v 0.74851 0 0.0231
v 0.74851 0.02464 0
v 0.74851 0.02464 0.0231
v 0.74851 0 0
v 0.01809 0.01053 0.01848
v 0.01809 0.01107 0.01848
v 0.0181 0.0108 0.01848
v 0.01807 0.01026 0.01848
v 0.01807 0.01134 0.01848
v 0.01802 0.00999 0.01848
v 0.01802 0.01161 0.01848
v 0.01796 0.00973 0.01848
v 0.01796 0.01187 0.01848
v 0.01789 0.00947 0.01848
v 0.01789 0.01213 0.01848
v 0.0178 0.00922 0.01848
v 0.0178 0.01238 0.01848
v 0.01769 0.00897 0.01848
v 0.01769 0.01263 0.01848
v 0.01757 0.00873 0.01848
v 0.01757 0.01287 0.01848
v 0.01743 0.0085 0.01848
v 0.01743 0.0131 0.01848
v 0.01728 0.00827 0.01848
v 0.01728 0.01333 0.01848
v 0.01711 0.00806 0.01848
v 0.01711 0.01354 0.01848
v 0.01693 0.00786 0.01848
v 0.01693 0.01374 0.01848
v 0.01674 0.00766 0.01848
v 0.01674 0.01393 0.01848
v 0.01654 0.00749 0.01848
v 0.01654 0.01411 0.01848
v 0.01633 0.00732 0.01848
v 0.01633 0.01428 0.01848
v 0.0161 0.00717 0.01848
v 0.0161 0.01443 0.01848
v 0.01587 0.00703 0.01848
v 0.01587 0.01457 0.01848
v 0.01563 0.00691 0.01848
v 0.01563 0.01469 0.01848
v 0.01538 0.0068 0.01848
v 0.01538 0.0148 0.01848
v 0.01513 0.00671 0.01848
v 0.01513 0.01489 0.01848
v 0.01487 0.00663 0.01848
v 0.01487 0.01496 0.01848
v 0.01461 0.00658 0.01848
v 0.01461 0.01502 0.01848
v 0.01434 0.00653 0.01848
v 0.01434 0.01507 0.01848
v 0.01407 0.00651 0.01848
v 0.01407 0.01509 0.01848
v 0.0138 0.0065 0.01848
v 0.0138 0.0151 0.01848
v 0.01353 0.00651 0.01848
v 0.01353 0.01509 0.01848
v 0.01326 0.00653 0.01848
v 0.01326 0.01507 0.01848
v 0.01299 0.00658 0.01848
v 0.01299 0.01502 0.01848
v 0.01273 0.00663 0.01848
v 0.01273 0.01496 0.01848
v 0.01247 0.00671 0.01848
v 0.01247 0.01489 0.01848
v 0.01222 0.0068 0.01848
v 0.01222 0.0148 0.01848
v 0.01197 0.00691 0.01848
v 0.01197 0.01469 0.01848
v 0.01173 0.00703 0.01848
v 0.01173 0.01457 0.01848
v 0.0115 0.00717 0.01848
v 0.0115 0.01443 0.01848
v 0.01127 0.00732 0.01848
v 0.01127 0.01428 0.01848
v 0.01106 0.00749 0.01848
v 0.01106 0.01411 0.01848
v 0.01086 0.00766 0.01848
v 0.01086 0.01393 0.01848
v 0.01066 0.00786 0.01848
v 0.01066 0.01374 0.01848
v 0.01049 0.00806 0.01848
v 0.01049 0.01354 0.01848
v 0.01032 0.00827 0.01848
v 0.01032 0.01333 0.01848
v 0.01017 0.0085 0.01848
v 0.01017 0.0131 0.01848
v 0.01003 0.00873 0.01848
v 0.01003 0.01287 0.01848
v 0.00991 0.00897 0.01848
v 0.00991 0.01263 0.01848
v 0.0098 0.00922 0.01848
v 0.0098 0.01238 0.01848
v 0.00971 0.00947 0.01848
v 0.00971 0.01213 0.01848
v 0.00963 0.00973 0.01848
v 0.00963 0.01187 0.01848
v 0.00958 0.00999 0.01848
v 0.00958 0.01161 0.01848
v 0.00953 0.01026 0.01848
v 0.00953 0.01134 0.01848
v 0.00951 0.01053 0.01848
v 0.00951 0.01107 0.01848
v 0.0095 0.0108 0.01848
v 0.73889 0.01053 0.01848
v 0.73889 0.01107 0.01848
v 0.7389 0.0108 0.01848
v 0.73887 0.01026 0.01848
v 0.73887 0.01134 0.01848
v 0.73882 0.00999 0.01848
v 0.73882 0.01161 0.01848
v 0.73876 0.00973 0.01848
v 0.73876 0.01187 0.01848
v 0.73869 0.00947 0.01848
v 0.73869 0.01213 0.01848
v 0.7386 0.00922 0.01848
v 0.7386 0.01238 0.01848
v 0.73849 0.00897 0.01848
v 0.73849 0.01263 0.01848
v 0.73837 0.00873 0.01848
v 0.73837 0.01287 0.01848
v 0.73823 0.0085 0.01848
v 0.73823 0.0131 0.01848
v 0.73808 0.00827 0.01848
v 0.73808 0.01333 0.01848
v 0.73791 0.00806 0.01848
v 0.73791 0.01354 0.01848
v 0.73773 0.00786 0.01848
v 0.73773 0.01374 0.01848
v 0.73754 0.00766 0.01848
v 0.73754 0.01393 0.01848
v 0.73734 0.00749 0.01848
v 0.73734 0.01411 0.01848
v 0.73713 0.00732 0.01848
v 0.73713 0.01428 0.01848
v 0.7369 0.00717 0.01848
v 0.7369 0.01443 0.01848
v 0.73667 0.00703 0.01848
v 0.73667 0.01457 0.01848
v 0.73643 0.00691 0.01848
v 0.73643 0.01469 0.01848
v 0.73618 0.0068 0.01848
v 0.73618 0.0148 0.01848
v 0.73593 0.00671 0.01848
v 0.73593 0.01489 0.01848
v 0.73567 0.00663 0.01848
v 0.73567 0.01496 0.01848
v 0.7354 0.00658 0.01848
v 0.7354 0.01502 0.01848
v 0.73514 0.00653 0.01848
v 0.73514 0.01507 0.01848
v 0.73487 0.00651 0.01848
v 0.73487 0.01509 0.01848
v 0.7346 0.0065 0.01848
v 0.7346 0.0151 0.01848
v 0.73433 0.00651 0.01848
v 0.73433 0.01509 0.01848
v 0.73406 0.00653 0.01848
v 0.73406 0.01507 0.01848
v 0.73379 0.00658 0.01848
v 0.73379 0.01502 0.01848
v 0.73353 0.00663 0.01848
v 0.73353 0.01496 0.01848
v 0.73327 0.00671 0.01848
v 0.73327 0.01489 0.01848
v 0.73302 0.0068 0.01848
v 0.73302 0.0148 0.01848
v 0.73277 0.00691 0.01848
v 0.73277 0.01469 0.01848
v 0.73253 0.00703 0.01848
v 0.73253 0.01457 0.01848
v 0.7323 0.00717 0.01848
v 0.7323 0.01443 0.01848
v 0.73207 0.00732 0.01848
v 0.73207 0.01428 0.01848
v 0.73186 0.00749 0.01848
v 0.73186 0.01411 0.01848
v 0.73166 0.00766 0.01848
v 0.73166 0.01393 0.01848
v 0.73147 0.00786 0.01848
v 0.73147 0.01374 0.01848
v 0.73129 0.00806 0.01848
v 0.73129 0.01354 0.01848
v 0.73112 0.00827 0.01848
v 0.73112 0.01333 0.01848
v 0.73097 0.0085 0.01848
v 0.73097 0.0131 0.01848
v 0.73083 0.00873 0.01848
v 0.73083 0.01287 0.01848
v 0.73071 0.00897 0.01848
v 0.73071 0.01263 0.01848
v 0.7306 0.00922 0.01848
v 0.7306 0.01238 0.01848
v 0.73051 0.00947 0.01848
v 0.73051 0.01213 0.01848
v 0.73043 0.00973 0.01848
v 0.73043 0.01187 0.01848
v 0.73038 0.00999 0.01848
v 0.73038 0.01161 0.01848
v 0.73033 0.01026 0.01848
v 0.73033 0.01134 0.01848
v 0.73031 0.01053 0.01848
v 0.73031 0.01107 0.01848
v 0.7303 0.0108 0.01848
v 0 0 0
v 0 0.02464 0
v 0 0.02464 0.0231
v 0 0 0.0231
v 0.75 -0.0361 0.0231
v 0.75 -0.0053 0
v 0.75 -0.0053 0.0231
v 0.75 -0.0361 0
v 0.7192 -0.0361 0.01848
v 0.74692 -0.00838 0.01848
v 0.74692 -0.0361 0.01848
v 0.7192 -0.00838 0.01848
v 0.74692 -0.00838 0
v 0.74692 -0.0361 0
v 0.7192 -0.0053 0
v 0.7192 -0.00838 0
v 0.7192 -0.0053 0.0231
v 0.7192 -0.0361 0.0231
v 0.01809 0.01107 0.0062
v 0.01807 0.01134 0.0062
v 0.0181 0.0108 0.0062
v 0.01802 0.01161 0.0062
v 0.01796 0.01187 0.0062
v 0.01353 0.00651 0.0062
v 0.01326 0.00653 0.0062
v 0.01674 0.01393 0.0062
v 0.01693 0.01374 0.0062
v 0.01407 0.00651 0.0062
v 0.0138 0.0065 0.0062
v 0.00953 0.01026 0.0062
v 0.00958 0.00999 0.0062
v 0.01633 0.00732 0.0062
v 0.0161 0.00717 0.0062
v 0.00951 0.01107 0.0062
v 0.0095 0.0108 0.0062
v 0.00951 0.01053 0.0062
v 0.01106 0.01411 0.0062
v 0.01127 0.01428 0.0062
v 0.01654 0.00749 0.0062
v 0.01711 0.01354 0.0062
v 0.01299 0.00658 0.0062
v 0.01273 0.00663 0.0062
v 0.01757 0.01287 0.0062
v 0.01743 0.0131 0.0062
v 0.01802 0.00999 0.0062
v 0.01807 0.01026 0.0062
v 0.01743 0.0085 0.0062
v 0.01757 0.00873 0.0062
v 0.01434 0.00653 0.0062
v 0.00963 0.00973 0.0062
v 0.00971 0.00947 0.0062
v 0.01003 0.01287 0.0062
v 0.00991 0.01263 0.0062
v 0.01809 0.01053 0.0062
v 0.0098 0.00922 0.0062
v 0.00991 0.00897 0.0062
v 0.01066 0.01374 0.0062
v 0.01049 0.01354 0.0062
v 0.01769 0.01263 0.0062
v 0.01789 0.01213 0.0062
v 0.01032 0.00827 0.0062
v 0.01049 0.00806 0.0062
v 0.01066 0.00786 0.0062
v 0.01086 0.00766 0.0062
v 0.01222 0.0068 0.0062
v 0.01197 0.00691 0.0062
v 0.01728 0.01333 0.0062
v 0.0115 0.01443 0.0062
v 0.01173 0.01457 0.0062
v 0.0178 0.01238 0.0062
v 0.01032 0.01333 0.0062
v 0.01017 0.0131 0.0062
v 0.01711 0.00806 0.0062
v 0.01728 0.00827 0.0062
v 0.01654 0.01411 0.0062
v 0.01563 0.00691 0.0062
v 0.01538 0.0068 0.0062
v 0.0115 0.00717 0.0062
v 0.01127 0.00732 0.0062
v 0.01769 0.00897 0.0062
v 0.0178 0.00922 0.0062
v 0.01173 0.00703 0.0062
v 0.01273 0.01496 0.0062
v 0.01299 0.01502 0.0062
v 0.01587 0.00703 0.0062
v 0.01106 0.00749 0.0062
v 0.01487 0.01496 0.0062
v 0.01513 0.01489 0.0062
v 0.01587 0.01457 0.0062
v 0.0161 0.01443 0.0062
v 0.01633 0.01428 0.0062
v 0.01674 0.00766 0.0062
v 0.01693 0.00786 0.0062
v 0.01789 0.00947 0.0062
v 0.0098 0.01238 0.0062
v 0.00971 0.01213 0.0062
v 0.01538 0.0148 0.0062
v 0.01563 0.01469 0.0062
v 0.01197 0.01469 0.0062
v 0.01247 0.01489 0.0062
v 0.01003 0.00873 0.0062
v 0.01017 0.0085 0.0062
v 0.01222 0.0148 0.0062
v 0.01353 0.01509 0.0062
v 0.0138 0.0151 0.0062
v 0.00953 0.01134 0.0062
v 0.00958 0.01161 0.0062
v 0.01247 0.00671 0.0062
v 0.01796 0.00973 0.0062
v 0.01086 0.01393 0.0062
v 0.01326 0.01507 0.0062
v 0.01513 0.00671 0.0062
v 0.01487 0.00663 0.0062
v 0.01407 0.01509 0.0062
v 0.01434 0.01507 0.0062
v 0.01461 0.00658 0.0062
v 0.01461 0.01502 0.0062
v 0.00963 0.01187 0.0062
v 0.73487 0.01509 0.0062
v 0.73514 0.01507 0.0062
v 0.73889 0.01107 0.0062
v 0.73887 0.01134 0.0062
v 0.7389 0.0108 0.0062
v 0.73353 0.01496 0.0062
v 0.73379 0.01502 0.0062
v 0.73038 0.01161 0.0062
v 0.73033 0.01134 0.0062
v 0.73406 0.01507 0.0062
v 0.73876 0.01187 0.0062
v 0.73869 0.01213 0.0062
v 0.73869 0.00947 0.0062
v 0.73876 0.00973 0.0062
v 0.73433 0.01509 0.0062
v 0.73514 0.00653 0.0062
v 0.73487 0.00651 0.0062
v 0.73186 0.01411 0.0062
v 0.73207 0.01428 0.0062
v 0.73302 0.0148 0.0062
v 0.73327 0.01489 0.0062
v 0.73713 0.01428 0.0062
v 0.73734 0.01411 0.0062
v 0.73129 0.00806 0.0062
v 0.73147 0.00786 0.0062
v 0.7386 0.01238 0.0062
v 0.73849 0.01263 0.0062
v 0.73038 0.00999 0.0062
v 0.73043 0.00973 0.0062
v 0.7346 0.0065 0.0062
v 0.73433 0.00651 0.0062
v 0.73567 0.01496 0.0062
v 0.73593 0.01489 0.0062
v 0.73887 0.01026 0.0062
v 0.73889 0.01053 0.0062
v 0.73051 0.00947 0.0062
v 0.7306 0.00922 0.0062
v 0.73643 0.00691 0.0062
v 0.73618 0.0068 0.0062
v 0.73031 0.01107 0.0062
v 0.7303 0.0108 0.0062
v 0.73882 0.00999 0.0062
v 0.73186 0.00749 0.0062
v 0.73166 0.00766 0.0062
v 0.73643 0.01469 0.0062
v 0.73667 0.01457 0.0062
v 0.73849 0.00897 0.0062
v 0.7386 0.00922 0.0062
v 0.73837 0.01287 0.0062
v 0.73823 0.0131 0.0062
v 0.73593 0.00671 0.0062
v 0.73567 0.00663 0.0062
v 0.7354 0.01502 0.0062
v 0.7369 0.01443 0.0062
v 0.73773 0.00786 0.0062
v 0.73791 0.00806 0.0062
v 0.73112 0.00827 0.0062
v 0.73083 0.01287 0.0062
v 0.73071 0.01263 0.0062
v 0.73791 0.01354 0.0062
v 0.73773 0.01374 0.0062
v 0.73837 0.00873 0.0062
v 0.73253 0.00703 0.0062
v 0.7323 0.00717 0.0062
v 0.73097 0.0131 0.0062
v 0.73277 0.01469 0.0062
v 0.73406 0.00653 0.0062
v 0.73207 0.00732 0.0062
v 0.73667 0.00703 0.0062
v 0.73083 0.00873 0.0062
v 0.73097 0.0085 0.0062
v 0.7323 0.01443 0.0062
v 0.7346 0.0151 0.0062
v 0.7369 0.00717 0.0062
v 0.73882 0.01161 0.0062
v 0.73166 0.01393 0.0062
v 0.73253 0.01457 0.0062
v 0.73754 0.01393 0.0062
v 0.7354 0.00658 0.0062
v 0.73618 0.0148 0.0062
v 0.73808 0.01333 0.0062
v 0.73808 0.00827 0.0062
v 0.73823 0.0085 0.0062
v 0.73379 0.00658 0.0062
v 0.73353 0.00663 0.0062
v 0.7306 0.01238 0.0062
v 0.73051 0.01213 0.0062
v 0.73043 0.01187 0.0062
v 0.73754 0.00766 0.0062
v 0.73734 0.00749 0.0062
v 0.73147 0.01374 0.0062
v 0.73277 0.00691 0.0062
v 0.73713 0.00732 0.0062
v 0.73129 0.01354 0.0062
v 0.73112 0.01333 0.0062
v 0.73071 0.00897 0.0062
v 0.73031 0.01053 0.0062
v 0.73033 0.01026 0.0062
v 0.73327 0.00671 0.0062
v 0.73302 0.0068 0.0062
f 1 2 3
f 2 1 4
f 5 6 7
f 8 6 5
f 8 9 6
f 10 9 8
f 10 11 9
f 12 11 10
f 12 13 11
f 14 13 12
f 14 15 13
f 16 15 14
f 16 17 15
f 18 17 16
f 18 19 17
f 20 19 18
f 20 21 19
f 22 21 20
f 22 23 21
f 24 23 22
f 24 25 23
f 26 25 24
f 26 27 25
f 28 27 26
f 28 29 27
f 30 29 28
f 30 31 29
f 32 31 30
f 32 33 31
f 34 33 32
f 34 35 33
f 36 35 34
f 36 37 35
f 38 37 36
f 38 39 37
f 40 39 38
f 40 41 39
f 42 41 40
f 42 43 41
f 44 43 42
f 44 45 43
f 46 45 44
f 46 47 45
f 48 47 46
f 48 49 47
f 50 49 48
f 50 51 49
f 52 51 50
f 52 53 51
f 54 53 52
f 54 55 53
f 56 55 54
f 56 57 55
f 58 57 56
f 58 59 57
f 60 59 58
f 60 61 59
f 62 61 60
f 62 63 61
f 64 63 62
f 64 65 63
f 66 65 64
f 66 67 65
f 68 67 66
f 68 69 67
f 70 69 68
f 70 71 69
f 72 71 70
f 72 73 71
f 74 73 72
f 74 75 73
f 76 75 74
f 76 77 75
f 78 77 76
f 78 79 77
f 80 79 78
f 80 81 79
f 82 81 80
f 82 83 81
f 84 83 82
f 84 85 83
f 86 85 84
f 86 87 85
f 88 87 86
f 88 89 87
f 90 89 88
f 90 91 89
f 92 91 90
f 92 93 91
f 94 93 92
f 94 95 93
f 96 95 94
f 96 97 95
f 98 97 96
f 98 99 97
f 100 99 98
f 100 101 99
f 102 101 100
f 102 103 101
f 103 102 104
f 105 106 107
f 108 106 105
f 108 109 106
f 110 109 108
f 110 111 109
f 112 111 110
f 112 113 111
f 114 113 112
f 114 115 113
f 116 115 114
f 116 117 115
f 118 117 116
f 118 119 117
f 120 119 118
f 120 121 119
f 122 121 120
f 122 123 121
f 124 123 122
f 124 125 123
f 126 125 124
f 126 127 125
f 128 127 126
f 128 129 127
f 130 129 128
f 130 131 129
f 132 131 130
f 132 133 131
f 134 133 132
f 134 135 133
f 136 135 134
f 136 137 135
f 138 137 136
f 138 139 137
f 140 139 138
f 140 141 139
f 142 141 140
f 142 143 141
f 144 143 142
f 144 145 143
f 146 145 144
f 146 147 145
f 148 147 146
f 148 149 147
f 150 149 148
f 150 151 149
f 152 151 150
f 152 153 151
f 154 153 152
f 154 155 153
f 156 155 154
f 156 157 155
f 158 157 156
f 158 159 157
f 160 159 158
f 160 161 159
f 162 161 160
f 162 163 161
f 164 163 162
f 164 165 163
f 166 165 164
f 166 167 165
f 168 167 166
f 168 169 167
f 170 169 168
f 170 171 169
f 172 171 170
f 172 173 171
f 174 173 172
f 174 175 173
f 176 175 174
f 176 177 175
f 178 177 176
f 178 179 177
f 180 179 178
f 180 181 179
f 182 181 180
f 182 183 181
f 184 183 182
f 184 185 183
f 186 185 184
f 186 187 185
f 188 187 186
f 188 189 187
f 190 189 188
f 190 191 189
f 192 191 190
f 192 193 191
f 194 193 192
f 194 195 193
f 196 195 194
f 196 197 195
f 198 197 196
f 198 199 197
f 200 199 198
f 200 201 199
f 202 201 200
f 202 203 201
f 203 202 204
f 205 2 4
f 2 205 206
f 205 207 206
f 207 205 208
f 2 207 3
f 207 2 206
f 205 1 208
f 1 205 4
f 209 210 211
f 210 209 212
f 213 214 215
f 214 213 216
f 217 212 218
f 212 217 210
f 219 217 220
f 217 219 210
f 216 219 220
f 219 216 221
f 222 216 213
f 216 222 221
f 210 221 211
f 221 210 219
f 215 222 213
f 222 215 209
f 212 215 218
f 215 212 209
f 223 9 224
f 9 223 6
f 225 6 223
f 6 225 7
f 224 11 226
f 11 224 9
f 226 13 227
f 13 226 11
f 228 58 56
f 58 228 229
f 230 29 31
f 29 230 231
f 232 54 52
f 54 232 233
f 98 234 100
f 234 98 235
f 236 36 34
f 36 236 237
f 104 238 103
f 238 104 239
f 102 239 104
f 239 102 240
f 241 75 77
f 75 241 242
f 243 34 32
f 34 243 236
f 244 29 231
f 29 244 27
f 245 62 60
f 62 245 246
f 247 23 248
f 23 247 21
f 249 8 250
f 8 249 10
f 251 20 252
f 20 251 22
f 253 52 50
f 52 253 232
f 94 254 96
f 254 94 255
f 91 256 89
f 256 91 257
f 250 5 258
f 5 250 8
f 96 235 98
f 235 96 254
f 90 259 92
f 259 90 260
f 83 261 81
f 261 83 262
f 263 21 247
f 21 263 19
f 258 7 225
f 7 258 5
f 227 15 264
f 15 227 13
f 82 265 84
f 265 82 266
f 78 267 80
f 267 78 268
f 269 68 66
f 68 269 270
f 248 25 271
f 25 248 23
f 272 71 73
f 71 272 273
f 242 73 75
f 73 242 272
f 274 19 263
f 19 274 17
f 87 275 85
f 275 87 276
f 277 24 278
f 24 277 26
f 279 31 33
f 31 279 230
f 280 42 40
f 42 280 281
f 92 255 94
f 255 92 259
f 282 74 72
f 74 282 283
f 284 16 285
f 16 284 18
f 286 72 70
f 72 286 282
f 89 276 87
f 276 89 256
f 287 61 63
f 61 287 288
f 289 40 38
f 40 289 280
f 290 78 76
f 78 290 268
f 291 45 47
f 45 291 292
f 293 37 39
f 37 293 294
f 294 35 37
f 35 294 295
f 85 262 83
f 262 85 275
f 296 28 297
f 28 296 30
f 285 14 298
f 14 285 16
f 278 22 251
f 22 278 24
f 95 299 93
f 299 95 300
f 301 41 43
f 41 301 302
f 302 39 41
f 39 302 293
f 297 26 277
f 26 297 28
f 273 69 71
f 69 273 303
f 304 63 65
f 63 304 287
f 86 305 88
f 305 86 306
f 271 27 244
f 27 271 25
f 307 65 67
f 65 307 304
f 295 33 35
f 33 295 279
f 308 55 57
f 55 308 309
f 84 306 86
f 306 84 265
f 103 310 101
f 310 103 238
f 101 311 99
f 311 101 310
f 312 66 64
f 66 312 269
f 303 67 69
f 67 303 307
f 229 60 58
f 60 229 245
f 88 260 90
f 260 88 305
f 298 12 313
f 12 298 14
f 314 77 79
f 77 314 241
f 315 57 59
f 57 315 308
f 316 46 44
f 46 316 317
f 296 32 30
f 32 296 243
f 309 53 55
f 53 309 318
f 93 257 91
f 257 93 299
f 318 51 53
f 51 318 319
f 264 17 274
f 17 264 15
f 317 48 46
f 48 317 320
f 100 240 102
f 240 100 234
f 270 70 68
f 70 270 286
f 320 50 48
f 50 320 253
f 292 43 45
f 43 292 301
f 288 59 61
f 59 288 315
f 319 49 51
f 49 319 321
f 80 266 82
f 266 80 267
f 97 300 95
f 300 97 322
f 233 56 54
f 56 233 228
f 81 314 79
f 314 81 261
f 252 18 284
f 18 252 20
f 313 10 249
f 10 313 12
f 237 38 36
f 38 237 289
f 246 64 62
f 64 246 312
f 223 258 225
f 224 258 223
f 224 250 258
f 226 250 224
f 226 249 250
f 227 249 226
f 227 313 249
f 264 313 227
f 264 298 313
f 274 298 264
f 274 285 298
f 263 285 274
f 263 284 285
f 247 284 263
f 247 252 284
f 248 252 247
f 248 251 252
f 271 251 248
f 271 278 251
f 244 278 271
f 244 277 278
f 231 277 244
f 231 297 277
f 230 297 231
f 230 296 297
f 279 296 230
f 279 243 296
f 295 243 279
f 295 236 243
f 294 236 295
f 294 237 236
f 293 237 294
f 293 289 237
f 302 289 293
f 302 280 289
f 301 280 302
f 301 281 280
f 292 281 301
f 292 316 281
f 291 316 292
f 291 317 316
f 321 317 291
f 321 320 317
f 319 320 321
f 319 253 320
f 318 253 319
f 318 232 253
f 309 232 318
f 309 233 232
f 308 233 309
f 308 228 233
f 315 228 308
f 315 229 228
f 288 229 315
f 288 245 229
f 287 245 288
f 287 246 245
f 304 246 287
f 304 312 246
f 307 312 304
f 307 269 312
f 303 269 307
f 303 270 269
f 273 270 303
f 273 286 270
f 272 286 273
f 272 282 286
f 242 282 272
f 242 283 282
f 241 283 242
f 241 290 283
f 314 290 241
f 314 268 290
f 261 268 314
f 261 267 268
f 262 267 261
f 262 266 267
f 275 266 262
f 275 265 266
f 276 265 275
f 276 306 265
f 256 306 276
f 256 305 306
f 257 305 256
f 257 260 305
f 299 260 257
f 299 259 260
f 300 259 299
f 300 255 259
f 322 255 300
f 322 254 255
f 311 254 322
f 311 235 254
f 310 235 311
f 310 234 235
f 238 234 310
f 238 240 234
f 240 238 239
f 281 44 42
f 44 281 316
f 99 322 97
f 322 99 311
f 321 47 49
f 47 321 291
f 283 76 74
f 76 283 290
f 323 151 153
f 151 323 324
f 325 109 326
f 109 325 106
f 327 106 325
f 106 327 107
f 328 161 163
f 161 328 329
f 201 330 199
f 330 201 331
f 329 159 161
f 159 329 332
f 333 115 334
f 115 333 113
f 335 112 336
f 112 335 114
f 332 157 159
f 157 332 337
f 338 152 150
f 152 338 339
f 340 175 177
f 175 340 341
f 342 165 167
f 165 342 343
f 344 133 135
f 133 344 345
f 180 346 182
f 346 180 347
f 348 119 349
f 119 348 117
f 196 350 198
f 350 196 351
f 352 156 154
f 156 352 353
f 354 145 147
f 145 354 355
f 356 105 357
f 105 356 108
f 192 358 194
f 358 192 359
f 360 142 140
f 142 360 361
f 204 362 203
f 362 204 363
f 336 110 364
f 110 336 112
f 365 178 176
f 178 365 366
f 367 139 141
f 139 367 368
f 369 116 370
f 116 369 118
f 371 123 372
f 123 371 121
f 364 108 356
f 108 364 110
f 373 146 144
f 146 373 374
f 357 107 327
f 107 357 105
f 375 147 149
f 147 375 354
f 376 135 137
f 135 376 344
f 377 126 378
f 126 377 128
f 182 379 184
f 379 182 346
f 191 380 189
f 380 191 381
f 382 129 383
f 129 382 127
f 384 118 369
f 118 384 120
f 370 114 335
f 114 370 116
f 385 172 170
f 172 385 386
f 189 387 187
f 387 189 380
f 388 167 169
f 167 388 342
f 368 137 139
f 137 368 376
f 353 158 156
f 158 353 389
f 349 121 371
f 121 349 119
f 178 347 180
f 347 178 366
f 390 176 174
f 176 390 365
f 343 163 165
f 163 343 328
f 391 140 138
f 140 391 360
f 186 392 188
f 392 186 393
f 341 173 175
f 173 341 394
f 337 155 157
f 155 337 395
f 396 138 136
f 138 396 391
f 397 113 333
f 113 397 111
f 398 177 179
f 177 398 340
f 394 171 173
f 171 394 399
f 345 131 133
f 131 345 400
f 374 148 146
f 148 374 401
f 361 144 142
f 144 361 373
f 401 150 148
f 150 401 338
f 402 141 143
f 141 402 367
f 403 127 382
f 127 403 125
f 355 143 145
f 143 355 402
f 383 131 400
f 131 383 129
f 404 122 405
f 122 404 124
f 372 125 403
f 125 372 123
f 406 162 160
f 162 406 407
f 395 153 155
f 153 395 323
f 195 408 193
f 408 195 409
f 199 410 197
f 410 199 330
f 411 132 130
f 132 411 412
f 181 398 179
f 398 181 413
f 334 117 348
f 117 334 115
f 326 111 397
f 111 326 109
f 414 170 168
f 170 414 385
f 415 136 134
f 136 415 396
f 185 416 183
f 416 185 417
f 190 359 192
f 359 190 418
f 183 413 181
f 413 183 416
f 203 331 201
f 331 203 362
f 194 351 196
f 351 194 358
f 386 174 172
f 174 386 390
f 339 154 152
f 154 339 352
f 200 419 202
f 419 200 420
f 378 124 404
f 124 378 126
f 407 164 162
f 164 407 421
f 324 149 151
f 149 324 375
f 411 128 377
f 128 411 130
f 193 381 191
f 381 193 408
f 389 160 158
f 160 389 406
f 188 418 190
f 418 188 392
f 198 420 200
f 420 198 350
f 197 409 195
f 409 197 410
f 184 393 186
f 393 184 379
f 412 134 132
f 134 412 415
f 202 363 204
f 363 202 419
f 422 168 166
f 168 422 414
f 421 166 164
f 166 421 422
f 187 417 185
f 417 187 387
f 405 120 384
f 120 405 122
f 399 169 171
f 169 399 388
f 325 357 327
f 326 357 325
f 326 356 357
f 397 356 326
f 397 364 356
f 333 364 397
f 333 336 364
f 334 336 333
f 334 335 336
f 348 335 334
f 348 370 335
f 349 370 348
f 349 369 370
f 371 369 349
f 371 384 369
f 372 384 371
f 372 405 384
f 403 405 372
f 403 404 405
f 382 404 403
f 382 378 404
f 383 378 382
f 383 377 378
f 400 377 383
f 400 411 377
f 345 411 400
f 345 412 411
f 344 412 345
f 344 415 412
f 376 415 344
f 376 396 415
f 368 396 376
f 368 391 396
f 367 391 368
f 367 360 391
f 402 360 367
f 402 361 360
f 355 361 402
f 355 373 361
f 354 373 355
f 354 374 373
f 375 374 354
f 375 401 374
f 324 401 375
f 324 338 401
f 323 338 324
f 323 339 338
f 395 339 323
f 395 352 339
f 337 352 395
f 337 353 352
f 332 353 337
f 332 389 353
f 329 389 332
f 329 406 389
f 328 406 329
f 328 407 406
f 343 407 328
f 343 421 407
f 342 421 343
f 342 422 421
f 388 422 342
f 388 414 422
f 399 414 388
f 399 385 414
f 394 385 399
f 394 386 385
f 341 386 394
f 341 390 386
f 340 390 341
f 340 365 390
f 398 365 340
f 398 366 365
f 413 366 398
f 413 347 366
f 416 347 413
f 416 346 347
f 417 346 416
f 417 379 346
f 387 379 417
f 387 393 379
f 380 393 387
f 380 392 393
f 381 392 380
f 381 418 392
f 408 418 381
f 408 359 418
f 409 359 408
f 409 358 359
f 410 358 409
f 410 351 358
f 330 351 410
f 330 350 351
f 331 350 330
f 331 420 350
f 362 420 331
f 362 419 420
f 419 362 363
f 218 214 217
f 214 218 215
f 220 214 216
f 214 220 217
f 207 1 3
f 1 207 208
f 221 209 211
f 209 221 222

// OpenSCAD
// OpenSCAD parametric model of rail with end block
$fn = 100;

// ============================================
// PARAMETRIC DIMENSIONS
// ============================================

// --- Main rail lower body ---
rail_length       = 0.748506;
rail_width        = 0.024642;
rail_lower_height = 0.018482;   // solid extrusion depth from base datum

// --- Rail shallow top layer ---
rail_top_thickness = 0.00462;    // raises upper surface toward 0.0231

// --- End block lower body ---
end_block_size        = 0.030803;
end_block_lower_height = 0.018482;

// --- End block shallow top layer ---
end_block_top_thickness = 0.00462;

// --- Circular recesses (pockets) ---
recess_radius    = 0.0043;
recess_z_bottom  = 0.0062;
recess_z_top     = 0.0185;
recess_height    = recess_z_top - recess_z_bottom;  // 0.0123

// --- End block rectangular cutout ---
cutout_size      = 0.027722;
cutout_z_top     = 0.0185;
cutout_z_bottom  = -0.0585;
cutout_height    = cutout_z_top - cutout_z_bottom;  // 0.077

// ============================================
// POSITIONS
// ============================================

// Rail datum: left end at X origin, front edge on Y axis
rail_origin_x = 0;
rail_front_y  = 0;

// Rail recess centers (x from left end, y offset from front edge)
rail_recess_x1 = 0.0138;
rail_recess_x2 = 0.7346;
rail_recess_y  = rail_front_y + 0.0108;

// End block placement
end_block_left_x  = 0.7192;
end_block_front_y = rail_front_y - 0.0361;   // in front of rail front edge

// End block circular recess center
end_recess_x = 0.7361;
end_recess_y = rail_front_y - 0.0192;        // in front of rail front edge

// ============================================
// MODULES
// ============================================

// Main reference rail lower body
module rail_lower() {
    translate([rail_origin_x, rail_front_y, 0])
        cube([rail_length, rail_width, rail_lower_height]);
}

// Second solid layer over full rail footprint
module rail_top() {
    translate([rail_origin_x, rail_front_y, rail_lower_height])
        cube([rail_length, rail_width, rail_top_thickness]);
}

// End block lower body
module end_block_lower() {
    translate([end_block_left_x, end_block_front_y, 0])
        cube([end_block_size, end_block_size, end_block_lower_height]);
}

// End block shallow top layer
module end_block_top() {
    translate([end_block_left_x, end_block_front_y, end_block_lower_height])
        cube([end_block_size, end_block_size, end_block_top_thickness]);
}

// Circular pocket (vertical recess band)
module circular_recess(px, py) {
    translate([px, py, recess_z_bottom])
        cylinder(h = recess_height, r = recess_radius);
}

// Deeper rectangular cutout sharing end block left and front edges
module end_block_cutout() {
    translate([end_block_left_x, end_block_front_y, cutout_z_bottom])
        cube([cutout_size, cutout_size, cutout_height]);
}

// ============================================
// ASSEMBLY
// ============================================

// Lower solid bodies with all pockets and cutouts removed
module lower_assembly() {
    difference() {
        union() {
            rail_lower();
            end_block_lower();
        }
        // Row of two circular recesses in rail
        circular_recess(rail_recess_x1, rail_recess_y);
        circular_recess(rail_recess_x2, rail_recess_y);
        // Circular recess in end block
        circular_recess(end_recess_x, end_recess_y);
        // Deeper rectangular cutout in end block
        end_block_cutout();
    }
}

// Final model: lower assembly plus shallow top layers
union() {
    lower_assembly();
    rail_top();
    end_block_top();
}
